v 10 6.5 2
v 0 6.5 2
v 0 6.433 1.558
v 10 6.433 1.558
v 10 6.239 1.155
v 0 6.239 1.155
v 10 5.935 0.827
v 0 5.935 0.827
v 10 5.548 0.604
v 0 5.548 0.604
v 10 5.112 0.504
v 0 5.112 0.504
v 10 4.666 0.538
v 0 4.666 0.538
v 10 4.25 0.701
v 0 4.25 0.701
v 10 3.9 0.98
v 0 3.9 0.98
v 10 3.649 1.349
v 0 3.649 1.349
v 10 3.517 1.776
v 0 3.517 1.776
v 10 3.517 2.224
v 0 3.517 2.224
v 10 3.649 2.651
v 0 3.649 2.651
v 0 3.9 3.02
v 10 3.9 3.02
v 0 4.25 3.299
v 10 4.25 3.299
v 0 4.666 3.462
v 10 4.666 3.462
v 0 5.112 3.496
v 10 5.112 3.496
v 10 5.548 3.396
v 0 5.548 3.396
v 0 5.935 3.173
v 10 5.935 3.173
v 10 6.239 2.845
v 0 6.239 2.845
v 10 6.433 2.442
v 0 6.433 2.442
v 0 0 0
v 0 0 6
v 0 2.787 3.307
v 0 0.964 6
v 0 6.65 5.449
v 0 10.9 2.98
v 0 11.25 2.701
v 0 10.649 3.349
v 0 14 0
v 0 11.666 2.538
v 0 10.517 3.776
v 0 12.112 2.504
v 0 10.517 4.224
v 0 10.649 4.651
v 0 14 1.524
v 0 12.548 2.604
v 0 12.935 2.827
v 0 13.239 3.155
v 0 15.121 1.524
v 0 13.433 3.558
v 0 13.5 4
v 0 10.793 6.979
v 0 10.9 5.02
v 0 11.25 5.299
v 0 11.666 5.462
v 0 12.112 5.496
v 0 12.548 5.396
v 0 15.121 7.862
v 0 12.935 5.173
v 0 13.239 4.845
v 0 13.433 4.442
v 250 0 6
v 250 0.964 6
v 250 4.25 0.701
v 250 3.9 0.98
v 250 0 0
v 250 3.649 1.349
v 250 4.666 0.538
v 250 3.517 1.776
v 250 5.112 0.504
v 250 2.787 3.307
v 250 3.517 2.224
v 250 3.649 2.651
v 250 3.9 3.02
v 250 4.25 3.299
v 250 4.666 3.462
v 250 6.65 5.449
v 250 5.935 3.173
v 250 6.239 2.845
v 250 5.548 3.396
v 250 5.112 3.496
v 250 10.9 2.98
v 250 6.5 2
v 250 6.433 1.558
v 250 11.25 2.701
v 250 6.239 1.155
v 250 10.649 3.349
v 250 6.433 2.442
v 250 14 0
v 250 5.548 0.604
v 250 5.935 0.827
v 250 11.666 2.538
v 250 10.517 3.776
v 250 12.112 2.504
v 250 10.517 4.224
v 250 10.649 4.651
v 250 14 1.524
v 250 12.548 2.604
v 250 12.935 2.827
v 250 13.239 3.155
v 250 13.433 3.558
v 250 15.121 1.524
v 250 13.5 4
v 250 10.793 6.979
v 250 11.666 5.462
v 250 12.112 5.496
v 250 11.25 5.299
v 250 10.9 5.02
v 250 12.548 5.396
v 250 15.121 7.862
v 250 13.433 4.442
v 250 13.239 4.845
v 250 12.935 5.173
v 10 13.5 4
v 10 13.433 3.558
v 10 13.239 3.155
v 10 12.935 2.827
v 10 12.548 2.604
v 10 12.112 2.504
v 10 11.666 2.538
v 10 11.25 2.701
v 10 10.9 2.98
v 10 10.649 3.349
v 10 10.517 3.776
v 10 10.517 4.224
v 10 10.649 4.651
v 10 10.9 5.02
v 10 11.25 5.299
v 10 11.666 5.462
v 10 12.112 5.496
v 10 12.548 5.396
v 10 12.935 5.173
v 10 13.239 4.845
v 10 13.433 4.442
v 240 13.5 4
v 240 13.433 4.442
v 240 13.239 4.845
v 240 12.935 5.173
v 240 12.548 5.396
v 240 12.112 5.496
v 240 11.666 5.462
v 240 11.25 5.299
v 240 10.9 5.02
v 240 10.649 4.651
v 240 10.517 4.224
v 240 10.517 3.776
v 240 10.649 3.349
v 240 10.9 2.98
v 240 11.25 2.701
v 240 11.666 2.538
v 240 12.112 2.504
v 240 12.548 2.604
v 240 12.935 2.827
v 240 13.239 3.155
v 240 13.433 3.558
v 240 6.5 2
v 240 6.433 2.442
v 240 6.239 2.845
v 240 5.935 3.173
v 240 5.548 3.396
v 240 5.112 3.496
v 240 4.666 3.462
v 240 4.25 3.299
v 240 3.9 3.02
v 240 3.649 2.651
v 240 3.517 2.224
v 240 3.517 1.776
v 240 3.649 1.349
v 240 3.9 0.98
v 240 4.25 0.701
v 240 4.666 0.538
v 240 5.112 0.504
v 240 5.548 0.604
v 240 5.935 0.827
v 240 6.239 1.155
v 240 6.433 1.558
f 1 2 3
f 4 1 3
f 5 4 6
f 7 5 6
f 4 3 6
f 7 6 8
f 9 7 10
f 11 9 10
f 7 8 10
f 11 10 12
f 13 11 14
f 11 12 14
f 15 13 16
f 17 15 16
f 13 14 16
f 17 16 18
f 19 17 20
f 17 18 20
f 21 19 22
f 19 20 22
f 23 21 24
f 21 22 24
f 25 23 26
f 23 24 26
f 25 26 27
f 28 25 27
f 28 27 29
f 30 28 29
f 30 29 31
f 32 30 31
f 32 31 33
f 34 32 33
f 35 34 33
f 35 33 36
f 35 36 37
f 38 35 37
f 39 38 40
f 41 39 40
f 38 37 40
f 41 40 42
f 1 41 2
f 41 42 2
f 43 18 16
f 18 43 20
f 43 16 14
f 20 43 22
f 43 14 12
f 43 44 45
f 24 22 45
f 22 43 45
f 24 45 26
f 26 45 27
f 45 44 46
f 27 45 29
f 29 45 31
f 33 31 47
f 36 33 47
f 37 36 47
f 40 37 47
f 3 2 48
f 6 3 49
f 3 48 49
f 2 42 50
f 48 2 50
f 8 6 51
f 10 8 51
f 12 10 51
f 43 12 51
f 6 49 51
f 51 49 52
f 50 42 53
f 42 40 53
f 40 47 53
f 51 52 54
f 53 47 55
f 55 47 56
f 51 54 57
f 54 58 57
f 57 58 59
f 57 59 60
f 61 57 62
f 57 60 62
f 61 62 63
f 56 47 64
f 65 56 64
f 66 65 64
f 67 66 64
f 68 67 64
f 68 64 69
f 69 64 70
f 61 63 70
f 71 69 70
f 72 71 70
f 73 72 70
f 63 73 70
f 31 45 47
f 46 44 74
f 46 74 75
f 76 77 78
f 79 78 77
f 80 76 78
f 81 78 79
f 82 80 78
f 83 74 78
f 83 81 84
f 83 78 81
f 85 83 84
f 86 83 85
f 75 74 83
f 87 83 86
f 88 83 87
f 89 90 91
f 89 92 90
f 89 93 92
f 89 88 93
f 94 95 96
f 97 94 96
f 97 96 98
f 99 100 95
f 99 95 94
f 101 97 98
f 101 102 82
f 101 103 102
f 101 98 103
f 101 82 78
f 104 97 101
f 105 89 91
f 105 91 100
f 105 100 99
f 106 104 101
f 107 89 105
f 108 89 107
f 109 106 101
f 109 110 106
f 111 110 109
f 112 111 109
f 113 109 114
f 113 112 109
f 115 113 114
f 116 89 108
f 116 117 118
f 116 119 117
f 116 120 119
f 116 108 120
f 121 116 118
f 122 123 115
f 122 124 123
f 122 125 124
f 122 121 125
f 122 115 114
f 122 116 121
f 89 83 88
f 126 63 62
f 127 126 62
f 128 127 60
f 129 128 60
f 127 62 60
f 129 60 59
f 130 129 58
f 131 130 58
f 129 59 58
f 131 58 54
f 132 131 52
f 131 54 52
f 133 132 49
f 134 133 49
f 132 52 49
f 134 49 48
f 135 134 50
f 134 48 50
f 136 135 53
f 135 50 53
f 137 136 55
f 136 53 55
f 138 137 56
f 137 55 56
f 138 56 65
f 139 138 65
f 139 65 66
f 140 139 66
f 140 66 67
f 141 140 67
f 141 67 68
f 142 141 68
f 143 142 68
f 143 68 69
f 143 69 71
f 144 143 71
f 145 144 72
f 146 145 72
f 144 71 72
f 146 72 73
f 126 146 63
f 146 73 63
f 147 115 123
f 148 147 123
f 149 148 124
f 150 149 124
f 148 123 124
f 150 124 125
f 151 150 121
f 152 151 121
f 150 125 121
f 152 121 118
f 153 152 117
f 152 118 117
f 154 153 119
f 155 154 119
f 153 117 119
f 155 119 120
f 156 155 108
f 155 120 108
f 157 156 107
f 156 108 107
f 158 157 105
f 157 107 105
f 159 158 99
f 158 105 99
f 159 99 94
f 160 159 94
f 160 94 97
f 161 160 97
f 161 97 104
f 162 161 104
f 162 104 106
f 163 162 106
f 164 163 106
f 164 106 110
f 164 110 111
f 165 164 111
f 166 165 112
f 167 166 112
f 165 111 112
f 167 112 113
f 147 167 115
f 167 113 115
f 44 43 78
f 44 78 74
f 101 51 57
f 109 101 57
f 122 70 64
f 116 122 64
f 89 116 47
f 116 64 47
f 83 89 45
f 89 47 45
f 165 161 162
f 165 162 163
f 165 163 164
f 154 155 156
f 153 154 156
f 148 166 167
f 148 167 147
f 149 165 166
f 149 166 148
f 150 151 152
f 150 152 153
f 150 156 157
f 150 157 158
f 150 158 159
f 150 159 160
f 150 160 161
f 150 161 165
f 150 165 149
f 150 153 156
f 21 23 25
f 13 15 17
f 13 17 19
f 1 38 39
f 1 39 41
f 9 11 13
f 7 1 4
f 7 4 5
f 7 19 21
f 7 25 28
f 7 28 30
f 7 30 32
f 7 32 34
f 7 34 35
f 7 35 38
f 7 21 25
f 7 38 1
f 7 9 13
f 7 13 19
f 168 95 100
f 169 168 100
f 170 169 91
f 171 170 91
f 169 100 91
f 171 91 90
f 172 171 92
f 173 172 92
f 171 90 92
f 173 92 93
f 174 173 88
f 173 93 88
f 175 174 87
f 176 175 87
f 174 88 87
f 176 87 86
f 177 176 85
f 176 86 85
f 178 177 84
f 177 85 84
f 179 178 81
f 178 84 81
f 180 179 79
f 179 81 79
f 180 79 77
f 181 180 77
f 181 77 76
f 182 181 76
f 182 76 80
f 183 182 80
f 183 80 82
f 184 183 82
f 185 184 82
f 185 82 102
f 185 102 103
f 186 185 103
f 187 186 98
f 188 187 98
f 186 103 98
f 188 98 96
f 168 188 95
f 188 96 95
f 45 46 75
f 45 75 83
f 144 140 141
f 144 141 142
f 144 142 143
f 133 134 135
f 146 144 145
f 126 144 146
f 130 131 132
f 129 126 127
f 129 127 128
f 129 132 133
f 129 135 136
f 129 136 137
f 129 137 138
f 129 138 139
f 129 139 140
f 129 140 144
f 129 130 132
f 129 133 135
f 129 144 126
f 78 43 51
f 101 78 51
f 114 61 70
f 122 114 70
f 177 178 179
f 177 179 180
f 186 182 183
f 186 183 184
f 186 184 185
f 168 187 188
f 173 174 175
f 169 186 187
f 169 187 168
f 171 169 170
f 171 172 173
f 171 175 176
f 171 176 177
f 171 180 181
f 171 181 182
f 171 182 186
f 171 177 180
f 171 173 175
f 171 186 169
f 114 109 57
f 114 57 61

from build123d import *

# Parameters (mm, degrees)
PAD_DEPTH       = 250
SKETCH001_R     = 1.5
POCKET_DEPTH    = 10
SKETCH002_R     = 1.5
POCKET001_DEPTH = 10


with BuildPart() as part:
    # Sketch → Pad (new body)
    with BuildSketch(Plane.YZ):
        with BuildLine():
            Line((0, 0), (14, 0))
            Line((14, 0), (14, 1.524))
            Line((14, 1.524), (15.121, 1.524))
            Line((15.121, 1.524), (15.121, 7.862))
            ThreePointArc((15.121, 7.862), (8.692711, 6.292749), (2.787425, 3.307276))
            Line((0.963795, 6), (2.787425, 3.307276))
            Line((0, 6), (0.963795, 6))
            Line((0, 0), (0, 6))
        make_face()
    extrude(amount=PAD_DEPTH)

    # Sketch001 (on Face10 of Pad) → Pocket (cut)
    with BuildSketch(Plane.YZ.offset(250)):
        with Locations((12, 4)):
            Circle(SKETCH001_R)
        with Locations((5, 2)):
            Circle(SKETCH001_R)
    extrude(amount=-POCKET_DEPTH, mode=Mode.SUBTRACT)

    # Sketch002 (on Face4 of Pocket) → Pocket001 (cut)
    with BuildSketch(Plane(origin=(0, 0, 0), x_dir=(0, 1, 0), z_dir=(-1, 0, 0))):
        with Locations((12, -4)):
            Circle(SKETCH002_R)
        with Locations((5, -2)):
            Circle(SKETCH002_R)
    extrude(amount=-POCKET001_DEPTH, mode=Mode.SUBTRACT)


solid = part.part
